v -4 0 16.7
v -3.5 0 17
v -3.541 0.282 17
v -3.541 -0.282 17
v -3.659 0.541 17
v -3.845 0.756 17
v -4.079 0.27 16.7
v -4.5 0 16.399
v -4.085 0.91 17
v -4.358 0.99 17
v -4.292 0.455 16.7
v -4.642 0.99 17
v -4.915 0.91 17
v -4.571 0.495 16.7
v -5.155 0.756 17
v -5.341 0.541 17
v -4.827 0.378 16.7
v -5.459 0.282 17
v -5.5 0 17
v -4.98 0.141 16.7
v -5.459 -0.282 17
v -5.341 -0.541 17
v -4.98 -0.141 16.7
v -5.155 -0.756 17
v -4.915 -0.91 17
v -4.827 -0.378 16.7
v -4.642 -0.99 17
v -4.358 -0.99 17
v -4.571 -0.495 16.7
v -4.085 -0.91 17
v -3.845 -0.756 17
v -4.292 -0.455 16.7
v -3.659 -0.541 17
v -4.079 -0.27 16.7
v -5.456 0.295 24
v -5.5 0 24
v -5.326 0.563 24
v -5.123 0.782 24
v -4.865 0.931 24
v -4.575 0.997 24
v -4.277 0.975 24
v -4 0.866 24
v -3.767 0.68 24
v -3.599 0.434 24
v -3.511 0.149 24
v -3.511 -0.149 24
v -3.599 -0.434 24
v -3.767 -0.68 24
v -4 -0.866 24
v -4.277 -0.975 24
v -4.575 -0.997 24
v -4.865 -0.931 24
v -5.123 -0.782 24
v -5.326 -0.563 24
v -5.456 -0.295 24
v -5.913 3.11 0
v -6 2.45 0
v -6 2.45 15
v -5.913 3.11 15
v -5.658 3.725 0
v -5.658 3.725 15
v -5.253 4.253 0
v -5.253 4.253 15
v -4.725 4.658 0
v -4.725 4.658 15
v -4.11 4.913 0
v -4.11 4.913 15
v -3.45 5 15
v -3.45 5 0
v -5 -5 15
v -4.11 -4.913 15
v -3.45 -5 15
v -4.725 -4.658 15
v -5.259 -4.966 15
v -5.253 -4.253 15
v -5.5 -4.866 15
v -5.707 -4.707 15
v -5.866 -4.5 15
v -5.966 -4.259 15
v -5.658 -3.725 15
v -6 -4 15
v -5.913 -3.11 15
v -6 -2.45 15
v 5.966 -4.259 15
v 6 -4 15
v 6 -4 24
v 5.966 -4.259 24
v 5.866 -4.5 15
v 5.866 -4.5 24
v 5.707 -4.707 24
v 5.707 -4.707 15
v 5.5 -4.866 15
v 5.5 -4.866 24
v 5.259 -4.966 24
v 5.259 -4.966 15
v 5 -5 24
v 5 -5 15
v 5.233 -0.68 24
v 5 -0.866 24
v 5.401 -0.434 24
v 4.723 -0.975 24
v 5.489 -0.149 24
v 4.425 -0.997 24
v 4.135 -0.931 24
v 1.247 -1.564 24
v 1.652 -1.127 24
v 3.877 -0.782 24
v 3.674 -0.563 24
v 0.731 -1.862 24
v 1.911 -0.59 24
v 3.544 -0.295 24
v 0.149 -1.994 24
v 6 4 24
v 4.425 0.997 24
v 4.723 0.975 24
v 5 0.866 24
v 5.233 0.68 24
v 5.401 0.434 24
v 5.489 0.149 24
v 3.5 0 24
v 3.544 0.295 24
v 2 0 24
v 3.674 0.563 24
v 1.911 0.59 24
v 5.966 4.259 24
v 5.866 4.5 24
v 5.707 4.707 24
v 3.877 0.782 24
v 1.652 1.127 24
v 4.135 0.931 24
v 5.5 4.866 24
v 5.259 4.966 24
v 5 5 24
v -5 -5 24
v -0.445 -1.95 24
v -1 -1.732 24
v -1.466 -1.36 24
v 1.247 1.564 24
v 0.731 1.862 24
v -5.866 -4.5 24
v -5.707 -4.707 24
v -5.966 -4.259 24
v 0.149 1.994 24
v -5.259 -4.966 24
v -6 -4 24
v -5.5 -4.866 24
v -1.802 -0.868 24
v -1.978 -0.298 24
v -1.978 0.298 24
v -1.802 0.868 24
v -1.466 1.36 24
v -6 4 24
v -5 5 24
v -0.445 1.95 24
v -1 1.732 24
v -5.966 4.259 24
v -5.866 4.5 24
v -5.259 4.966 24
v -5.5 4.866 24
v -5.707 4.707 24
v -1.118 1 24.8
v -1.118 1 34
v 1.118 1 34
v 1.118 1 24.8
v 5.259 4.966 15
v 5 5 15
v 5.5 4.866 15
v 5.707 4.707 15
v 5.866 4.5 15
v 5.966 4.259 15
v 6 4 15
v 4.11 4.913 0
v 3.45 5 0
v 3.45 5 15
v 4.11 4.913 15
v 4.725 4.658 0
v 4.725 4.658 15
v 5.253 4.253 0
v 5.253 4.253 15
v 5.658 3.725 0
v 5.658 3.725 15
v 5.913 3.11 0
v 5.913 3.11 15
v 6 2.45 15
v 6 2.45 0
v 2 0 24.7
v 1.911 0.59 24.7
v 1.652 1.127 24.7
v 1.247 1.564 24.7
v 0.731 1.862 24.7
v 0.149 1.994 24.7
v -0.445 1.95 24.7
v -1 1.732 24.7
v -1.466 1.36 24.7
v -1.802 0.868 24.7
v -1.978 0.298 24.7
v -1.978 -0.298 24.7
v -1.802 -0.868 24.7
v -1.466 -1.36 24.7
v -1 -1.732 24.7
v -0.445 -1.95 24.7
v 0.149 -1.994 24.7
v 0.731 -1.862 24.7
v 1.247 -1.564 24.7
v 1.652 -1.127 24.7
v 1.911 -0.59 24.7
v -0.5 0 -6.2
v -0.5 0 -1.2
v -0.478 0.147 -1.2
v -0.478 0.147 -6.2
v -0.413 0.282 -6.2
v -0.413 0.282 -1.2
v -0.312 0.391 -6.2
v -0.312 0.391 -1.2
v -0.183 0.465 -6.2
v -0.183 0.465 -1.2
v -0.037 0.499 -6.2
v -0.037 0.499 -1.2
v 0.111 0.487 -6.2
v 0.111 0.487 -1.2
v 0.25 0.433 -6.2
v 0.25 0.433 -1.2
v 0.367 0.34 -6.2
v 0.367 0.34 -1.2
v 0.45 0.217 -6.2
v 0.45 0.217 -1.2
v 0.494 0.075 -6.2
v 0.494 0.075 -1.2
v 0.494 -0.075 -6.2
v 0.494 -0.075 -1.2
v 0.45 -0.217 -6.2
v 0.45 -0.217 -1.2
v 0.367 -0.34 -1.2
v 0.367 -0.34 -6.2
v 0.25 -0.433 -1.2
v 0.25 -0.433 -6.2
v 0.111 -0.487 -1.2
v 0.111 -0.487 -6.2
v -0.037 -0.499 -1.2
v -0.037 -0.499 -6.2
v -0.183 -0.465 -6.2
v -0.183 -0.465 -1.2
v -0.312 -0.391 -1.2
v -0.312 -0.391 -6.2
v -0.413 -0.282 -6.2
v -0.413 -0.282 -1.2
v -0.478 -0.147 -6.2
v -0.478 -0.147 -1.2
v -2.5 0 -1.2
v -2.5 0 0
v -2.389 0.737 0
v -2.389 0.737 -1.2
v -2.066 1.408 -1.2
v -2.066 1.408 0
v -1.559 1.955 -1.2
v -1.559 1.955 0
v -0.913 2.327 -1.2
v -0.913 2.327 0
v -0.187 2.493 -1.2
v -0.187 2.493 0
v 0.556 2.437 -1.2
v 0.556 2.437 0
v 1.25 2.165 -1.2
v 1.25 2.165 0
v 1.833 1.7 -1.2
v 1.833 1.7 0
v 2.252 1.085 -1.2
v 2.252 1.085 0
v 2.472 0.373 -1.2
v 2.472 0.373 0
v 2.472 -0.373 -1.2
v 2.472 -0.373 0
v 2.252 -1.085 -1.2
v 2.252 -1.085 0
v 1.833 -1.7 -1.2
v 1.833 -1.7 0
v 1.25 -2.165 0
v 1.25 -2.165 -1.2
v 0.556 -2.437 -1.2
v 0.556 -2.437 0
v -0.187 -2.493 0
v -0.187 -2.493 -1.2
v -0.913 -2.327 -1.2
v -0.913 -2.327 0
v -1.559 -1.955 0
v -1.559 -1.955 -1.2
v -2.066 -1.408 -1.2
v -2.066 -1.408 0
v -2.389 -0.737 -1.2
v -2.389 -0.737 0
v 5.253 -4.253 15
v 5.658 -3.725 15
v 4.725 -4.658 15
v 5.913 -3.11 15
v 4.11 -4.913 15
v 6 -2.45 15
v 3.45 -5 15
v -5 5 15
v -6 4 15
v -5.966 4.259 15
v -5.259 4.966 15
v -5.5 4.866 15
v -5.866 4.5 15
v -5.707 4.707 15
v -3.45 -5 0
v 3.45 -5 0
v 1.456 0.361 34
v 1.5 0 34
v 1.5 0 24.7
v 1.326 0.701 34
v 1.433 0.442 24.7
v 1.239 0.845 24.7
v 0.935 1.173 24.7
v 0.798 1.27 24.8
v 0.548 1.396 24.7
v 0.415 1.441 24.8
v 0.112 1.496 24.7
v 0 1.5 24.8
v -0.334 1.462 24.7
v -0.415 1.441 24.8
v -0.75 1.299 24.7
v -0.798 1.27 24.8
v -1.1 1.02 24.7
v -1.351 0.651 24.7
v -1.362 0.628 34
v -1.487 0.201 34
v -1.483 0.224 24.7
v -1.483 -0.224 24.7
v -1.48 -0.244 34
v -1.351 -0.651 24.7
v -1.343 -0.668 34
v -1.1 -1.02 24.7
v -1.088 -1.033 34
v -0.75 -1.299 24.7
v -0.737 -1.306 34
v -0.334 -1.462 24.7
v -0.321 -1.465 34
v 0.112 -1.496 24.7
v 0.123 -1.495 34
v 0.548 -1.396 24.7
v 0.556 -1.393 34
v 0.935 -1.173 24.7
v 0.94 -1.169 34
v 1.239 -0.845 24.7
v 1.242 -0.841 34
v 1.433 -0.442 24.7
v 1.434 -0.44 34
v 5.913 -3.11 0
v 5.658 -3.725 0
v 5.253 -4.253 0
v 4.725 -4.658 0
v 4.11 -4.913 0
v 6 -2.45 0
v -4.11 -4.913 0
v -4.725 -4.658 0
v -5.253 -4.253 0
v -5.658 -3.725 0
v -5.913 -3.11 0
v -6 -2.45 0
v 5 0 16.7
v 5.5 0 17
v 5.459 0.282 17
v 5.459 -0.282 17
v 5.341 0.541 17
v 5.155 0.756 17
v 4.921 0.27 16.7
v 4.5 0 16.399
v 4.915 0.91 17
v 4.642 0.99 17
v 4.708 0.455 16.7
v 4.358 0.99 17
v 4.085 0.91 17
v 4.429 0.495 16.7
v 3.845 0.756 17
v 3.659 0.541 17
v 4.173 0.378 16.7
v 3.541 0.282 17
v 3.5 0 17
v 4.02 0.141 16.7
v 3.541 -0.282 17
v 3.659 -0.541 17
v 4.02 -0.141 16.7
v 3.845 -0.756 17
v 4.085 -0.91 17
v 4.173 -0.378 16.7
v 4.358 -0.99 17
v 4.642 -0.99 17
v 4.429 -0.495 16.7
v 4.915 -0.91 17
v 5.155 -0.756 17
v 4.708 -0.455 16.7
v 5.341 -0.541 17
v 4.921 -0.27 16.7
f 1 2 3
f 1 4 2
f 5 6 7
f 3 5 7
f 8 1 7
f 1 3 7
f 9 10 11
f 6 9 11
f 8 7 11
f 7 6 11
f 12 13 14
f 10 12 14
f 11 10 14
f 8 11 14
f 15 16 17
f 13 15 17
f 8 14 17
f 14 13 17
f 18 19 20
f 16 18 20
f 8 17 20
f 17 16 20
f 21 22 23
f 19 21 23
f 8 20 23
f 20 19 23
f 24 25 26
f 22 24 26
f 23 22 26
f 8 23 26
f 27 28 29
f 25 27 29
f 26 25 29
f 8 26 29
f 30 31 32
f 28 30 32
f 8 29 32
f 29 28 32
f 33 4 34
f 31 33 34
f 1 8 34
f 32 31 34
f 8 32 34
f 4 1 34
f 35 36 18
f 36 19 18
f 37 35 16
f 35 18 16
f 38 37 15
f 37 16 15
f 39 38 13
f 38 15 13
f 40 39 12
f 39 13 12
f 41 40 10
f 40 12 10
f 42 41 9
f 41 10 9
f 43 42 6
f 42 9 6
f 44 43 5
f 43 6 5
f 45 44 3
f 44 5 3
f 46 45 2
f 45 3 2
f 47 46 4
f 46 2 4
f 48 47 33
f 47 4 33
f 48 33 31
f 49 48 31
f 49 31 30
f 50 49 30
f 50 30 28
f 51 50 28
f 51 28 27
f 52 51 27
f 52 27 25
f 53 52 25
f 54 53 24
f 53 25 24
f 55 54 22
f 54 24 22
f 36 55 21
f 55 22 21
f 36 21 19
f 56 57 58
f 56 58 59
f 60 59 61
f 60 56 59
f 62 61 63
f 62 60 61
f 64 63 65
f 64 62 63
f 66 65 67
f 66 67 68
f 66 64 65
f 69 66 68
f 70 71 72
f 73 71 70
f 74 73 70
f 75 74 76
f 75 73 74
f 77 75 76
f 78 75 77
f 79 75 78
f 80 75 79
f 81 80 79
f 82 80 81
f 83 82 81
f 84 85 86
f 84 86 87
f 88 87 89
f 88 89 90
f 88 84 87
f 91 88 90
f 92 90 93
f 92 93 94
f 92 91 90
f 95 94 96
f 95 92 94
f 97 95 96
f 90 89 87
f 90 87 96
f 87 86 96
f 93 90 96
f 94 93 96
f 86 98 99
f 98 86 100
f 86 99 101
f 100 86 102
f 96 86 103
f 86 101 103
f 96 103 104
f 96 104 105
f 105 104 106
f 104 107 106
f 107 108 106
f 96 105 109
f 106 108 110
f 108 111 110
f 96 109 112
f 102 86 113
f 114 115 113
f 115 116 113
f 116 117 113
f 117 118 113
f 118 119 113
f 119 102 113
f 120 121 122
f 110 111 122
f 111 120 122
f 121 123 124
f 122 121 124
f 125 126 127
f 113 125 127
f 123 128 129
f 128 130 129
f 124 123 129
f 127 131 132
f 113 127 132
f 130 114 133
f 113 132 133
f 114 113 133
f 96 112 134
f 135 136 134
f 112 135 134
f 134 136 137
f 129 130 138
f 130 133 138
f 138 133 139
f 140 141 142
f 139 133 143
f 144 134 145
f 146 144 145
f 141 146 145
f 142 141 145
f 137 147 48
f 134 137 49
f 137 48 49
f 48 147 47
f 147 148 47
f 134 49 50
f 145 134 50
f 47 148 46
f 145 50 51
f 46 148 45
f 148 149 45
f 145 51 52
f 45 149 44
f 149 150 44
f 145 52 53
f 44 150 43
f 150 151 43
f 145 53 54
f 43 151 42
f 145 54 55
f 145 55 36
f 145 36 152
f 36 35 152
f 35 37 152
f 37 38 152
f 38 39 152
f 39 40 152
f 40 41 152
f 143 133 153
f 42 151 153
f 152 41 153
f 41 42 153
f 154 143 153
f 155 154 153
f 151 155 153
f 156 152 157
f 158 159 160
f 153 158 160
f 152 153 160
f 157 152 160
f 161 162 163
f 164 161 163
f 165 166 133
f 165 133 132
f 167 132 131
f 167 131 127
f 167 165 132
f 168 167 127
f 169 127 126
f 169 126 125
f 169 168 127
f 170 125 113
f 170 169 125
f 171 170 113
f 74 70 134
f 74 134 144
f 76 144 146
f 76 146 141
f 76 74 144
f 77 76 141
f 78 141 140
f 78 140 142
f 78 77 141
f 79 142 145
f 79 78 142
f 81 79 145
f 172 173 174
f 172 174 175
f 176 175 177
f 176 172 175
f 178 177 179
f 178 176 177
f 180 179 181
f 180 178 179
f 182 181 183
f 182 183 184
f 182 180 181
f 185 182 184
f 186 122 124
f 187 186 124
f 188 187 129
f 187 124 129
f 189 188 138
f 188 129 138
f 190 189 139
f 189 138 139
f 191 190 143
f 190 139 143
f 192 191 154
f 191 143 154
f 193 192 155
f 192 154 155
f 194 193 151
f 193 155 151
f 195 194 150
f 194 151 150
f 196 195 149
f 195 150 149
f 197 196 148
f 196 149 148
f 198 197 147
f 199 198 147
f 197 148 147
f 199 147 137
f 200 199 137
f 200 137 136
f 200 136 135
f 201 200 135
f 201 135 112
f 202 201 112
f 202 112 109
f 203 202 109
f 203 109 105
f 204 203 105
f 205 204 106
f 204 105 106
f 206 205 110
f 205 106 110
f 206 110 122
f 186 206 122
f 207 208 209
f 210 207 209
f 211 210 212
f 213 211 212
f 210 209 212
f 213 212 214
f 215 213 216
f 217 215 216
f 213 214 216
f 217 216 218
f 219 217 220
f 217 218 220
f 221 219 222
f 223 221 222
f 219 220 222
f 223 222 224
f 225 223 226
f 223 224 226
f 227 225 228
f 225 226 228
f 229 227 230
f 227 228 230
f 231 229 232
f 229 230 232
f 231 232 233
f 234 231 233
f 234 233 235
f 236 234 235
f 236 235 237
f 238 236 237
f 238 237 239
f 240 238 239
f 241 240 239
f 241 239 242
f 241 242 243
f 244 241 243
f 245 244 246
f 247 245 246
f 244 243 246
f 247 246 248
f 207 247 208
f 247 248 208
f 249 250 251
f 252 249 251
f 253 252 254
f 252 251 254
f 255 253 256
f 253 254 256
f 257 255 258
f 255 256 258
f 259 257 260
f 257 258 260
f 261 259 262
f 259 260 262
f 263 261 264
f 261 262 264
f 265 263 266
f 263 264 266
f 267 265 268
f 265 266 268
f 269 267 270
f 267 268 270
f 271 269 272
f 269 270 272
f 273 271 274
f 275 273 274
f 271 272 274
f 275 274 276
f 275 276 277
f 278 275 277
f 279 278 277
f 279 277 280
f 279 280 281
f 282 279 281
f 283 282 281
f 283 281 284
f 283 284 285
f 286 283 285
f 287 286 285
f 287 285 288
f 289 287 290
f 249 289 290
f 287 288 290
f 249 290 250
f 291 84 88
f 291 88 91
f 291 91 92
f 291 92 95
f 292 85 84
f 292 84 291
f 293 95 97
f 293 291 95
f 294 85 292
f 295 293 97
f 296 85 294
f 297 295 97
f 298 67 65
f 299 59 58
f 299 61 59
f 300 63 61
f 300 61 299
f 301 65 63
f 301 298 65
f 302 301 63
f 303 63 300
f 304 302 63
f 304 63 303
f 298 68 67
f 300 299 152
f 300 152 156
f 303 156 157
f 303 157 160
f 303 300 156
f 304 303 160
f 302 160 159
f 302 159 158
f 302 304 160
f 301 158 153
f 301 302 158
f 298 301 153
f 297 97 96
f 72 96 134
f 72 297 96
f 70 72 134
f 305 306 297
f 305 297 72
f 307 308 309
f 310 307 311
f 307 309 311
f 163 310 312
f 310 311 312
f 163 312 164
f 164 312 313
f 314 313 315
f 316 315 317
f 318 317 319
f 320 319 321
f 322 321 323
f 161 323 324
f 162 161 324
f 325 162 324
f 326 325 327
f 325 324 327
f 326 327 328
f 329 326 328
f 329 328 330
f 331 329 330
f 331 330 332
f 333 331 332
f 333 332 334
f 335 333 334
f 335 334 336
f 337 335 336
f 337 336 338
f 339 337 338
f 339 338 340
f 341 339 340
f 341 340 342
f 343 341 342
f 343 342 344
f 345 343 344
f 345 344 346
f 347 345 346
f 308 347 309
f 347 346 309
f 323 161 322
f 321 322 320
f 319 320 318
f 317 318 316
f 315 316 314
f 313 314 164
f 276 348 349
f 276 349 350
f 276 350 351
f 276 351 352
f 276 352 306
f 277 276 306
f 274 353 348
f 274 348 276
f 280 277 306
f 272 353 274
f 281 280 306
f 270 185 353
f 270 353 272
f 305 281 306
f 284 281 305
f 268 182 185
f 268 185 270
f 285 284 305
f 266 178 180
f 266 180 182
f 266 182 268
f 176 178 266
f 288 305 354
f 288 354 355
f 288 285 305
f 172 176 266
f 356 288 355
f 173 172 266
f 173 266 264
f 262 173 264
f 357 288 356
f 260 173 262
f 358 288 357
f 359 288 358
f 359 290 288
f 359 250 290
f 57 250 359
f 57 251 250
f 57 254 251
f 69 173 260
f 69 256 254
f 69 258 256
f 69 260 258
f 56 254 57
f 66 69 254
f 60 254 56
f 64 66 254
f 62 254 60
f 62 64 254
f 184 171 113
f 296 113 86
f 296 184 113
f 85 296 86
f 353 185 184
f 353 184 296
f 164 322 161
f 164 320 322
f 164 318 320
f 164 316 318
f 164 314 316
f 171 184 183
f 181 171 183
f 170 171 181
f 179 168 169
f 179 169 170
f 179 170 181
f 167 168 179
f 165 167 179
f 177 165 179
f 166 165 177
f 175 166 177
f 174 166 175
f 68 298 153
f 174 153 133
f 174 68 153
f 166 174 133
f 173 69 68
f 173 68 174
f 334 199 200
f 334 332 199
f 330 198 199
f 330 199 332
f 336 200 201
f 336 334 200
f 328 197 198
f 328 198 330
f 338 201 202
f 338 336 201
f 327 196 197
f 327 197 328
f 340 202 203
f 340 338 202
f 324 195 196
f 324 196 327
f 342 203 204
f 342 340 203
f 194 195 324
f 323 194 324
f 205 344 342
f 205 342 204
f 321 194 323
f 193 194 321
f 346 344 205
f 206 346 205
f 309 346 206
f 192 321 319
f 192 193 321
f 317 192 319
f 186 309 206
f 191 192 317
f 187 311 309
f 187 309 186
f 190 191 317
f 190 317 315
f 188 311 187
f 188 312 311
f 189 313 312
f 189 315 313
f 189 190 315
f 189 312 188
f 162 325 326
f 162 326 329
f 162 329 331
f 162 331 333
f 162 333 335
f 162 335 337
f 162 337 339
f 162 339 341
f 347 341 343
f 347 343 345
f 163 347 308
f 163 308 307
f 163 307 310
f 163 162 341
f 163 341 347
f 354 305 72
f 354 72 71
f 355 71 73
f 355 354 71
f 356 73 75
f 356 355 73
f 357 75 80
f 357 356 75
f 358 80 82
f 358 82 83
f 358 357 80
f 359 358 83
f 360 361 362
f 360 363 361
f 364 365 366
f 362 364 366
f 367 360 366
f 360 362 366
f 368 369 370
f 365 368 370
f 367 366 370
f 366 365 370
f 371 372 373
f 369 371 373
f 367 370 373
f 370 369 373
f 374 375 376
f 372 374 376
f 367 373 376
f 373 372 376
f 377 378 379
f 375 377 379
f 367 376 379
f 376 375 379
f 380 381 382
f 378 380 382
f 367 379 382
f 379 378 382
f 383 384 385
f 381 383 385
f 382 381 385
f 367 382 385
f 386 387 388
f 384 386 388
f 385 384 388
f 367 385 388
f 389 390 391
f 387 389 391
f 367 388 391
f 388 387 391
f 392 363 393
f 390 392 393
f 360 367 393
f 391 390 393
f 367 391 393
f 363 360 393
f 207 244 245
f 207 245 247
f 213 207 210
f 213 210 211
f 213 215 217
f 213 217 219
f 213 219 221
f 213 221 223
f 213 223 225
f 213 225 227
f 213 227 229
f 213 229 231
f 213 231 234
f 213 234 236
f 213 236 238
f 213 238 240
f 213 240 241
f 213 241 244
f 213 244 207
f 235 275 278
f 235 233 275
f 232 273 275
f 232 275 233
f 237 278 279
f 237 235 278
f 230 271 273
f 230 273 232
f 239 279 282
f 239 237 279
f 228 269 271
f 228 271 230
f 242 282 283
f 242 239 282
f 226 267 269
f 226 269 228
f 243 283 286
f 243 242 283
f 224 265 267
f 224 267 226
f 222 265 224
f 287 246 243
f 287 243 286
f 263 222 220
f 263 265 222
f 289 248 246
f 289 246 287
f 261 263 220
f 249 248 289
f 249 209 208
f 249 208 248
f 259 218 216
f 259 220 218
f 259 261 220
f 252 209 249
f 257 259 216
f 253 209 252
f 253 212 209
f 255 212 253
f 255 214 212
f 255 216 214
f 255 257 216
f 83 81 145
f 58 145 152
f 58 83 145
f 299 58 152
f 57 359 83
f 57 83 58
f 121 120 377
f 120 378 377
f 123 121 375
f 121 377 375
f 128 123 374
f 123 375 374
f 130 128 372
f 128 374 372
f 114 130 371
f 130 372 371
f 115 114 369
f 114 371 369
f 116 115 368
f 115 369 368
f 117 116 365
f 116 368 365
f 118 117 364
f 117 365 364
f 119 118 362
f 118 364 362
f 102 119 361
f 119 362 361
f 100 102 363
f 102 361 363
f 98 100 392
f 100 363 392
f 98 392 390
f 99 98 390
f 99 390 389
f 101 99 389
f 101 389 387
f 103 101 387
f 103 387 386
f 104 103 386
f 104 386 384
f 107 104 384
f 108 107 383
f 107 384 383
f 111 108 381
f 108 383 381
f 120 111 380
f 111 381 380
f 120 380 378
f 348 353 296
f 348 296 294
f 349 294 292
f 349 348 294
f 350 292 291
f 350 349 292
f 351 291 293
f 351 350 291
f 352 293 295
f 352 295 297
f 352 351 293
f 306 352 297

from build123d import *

# Parameters (mm, degrees)
BOSS_EXTRUDE1_DEPTH        = 15
BOSS_EXTRUDE2_DEPTH        = 9
SKETCH3_R                  = 2
BOSS_EXTRUDE3_DEPTH        = 0.7
SKETCH4_R                  = 1.5
BOSS_EXTRUDE4_DEPTH        = 9.3
SKETCH5_W                  = 3
SKETCH5_H                  = 1
CUT_EXTRUDE1_DEPTH         = 9.2
SKETCH6_R                  = 2.5
BOSS_EXTRUDE5_DEPTH        = 1.2
SKETCH7_R                  = 0.5
BOSS_EXTRUDE6_DEPTH        = 5
M1_6_CLEARANCE_HOLE1_D     = 2
M1_6_CLEARANCE_HOLE1_DEPTH = 7
M1_6_CLEARANCE_HOLE1_TIP   = 0.600860619


with BuildPart() as part:
    # Sketch1 → Boss-Extrude1 (new body)
    with BuildSketch(Plane.XY):
        with BuildLine():
            Line((3.45, -5), (-3.45, -5))
            ThreePointArc((-3.45, -5), (-5.253122292, -4.253122292), (-6, -2.45))
            Line((-6, -2.45), (-6, 2.45))
            ThreePointArc((-6, 2.45), (-5.253122292, 4.253122292), (-3.45, 5))
            Line((-3.45, 5), (3.45, 5))
            ThreePointArc((3.45, 5), (5.253122292, 4.253122292), (6, 2.45))
            Line((6, 2.45), (6, -2.45))
            ThreePointArc((6, -2.45), (5.253122292, -4.253122292), (3.45, -5))
        make_face()
    extrude(amount=BOSS_EXTRUDE1_DEPTH)

    # Sketch2 → Boss-Extrude2 (add)
    with BuildSketch(Plane.XY.offset(15)):
        with BuildLine():
            Line((5, -5), (-5, -5))
            ThreePointArc((-5, -5), (-5.707106781, -4.707106781), (-6, -4))
            Line((-6, -4), (-6, 4))
            ThreePointArc((-6, 4), (-5.707106781, 4.707106781), (-5, 5))
            Line((-5, 5), (5, 5))
            ThreePointArc((5, 5), (5.707106781, 4.707106781), (6, 4))
            Line((6, 4), (6, -4))
            ThreePointArc((6, -4), (5.707106781, -4.707106781), (5, -5))
        make_face()
    extrude(amount=BOSS_EXTRUDE2_DEPTH)

    # Sketch3 → Boss-Extrude3 (add)
    with BuildSketch(Plane.XY.offset(24)):
        Circle(SKETCH3_R)
    extrude(amount=BOSS_EXTRUDE3_DEPTH)

    # Sketch4 → Boss-Extrude4 (add)
    with BuildSketch(Plane.XY.offset(24.7)):
        Circle(SKETCH4_R)
    extrude(amount=BOSS_EXTRUDE4_DEPTH)

    # Sketch5 → Cut-Extrude1 (cut)
    with BuildSketch(Plane.XY.offset(34)):
        with Locations((0, 1.5)):
            Rectangle(SKETCH5_W, SKETCH5_H)
    extrude(amount=-CUT_EXTRUDE1_DEPTH, mode=Mode.SUBTRACT)

    # Sketch6 → Boss-Extrude5 (add)
    with BuildSketch(Plane(origin=(0, 0, 0), x_dir=(-1, 0, 0), z_dir=(0, 0, -1))):
        Circle(SKETCH6_R)
    extrude(amount=BOSS_EXTRUDE5_DEPTH)

    # Sketch7 → Boss-Extrude6 (add)
    with BuildSketch(Plane(origin=(0, 0, -1.2), x_dir=(-1, 0, 0), z_dir=(0, 0, -1))):
        Circle(SKETCH7_R)
    extrude(amount=BOSS_EXTRUDE6_DEPTH)

    # M1.6 Clearance Hole1
    with Locations(Plane.XY.offset(24)):
        with Locations((-4.5, 0), (4.5, 0)):
            Hole(M1_6_CLEARANCE_HOLE1_D / 2, depth=M1_6_CLEARANCE_HOLE1_DEPTH)
            with Locations((0, 0, -(M1_6_CLEARANCE_HOLE1_DEPTH + M1_6_CLEARANCE_HOLE1_TIP / 2))):  # 118° drill point
                Cone(0, M1_6_CLEARANCE_HOLE1_D / 2, M1_6_CLEARANCE_HOLE1_TIP, mode=Mode.SUBTRACT)


solid = part.part
